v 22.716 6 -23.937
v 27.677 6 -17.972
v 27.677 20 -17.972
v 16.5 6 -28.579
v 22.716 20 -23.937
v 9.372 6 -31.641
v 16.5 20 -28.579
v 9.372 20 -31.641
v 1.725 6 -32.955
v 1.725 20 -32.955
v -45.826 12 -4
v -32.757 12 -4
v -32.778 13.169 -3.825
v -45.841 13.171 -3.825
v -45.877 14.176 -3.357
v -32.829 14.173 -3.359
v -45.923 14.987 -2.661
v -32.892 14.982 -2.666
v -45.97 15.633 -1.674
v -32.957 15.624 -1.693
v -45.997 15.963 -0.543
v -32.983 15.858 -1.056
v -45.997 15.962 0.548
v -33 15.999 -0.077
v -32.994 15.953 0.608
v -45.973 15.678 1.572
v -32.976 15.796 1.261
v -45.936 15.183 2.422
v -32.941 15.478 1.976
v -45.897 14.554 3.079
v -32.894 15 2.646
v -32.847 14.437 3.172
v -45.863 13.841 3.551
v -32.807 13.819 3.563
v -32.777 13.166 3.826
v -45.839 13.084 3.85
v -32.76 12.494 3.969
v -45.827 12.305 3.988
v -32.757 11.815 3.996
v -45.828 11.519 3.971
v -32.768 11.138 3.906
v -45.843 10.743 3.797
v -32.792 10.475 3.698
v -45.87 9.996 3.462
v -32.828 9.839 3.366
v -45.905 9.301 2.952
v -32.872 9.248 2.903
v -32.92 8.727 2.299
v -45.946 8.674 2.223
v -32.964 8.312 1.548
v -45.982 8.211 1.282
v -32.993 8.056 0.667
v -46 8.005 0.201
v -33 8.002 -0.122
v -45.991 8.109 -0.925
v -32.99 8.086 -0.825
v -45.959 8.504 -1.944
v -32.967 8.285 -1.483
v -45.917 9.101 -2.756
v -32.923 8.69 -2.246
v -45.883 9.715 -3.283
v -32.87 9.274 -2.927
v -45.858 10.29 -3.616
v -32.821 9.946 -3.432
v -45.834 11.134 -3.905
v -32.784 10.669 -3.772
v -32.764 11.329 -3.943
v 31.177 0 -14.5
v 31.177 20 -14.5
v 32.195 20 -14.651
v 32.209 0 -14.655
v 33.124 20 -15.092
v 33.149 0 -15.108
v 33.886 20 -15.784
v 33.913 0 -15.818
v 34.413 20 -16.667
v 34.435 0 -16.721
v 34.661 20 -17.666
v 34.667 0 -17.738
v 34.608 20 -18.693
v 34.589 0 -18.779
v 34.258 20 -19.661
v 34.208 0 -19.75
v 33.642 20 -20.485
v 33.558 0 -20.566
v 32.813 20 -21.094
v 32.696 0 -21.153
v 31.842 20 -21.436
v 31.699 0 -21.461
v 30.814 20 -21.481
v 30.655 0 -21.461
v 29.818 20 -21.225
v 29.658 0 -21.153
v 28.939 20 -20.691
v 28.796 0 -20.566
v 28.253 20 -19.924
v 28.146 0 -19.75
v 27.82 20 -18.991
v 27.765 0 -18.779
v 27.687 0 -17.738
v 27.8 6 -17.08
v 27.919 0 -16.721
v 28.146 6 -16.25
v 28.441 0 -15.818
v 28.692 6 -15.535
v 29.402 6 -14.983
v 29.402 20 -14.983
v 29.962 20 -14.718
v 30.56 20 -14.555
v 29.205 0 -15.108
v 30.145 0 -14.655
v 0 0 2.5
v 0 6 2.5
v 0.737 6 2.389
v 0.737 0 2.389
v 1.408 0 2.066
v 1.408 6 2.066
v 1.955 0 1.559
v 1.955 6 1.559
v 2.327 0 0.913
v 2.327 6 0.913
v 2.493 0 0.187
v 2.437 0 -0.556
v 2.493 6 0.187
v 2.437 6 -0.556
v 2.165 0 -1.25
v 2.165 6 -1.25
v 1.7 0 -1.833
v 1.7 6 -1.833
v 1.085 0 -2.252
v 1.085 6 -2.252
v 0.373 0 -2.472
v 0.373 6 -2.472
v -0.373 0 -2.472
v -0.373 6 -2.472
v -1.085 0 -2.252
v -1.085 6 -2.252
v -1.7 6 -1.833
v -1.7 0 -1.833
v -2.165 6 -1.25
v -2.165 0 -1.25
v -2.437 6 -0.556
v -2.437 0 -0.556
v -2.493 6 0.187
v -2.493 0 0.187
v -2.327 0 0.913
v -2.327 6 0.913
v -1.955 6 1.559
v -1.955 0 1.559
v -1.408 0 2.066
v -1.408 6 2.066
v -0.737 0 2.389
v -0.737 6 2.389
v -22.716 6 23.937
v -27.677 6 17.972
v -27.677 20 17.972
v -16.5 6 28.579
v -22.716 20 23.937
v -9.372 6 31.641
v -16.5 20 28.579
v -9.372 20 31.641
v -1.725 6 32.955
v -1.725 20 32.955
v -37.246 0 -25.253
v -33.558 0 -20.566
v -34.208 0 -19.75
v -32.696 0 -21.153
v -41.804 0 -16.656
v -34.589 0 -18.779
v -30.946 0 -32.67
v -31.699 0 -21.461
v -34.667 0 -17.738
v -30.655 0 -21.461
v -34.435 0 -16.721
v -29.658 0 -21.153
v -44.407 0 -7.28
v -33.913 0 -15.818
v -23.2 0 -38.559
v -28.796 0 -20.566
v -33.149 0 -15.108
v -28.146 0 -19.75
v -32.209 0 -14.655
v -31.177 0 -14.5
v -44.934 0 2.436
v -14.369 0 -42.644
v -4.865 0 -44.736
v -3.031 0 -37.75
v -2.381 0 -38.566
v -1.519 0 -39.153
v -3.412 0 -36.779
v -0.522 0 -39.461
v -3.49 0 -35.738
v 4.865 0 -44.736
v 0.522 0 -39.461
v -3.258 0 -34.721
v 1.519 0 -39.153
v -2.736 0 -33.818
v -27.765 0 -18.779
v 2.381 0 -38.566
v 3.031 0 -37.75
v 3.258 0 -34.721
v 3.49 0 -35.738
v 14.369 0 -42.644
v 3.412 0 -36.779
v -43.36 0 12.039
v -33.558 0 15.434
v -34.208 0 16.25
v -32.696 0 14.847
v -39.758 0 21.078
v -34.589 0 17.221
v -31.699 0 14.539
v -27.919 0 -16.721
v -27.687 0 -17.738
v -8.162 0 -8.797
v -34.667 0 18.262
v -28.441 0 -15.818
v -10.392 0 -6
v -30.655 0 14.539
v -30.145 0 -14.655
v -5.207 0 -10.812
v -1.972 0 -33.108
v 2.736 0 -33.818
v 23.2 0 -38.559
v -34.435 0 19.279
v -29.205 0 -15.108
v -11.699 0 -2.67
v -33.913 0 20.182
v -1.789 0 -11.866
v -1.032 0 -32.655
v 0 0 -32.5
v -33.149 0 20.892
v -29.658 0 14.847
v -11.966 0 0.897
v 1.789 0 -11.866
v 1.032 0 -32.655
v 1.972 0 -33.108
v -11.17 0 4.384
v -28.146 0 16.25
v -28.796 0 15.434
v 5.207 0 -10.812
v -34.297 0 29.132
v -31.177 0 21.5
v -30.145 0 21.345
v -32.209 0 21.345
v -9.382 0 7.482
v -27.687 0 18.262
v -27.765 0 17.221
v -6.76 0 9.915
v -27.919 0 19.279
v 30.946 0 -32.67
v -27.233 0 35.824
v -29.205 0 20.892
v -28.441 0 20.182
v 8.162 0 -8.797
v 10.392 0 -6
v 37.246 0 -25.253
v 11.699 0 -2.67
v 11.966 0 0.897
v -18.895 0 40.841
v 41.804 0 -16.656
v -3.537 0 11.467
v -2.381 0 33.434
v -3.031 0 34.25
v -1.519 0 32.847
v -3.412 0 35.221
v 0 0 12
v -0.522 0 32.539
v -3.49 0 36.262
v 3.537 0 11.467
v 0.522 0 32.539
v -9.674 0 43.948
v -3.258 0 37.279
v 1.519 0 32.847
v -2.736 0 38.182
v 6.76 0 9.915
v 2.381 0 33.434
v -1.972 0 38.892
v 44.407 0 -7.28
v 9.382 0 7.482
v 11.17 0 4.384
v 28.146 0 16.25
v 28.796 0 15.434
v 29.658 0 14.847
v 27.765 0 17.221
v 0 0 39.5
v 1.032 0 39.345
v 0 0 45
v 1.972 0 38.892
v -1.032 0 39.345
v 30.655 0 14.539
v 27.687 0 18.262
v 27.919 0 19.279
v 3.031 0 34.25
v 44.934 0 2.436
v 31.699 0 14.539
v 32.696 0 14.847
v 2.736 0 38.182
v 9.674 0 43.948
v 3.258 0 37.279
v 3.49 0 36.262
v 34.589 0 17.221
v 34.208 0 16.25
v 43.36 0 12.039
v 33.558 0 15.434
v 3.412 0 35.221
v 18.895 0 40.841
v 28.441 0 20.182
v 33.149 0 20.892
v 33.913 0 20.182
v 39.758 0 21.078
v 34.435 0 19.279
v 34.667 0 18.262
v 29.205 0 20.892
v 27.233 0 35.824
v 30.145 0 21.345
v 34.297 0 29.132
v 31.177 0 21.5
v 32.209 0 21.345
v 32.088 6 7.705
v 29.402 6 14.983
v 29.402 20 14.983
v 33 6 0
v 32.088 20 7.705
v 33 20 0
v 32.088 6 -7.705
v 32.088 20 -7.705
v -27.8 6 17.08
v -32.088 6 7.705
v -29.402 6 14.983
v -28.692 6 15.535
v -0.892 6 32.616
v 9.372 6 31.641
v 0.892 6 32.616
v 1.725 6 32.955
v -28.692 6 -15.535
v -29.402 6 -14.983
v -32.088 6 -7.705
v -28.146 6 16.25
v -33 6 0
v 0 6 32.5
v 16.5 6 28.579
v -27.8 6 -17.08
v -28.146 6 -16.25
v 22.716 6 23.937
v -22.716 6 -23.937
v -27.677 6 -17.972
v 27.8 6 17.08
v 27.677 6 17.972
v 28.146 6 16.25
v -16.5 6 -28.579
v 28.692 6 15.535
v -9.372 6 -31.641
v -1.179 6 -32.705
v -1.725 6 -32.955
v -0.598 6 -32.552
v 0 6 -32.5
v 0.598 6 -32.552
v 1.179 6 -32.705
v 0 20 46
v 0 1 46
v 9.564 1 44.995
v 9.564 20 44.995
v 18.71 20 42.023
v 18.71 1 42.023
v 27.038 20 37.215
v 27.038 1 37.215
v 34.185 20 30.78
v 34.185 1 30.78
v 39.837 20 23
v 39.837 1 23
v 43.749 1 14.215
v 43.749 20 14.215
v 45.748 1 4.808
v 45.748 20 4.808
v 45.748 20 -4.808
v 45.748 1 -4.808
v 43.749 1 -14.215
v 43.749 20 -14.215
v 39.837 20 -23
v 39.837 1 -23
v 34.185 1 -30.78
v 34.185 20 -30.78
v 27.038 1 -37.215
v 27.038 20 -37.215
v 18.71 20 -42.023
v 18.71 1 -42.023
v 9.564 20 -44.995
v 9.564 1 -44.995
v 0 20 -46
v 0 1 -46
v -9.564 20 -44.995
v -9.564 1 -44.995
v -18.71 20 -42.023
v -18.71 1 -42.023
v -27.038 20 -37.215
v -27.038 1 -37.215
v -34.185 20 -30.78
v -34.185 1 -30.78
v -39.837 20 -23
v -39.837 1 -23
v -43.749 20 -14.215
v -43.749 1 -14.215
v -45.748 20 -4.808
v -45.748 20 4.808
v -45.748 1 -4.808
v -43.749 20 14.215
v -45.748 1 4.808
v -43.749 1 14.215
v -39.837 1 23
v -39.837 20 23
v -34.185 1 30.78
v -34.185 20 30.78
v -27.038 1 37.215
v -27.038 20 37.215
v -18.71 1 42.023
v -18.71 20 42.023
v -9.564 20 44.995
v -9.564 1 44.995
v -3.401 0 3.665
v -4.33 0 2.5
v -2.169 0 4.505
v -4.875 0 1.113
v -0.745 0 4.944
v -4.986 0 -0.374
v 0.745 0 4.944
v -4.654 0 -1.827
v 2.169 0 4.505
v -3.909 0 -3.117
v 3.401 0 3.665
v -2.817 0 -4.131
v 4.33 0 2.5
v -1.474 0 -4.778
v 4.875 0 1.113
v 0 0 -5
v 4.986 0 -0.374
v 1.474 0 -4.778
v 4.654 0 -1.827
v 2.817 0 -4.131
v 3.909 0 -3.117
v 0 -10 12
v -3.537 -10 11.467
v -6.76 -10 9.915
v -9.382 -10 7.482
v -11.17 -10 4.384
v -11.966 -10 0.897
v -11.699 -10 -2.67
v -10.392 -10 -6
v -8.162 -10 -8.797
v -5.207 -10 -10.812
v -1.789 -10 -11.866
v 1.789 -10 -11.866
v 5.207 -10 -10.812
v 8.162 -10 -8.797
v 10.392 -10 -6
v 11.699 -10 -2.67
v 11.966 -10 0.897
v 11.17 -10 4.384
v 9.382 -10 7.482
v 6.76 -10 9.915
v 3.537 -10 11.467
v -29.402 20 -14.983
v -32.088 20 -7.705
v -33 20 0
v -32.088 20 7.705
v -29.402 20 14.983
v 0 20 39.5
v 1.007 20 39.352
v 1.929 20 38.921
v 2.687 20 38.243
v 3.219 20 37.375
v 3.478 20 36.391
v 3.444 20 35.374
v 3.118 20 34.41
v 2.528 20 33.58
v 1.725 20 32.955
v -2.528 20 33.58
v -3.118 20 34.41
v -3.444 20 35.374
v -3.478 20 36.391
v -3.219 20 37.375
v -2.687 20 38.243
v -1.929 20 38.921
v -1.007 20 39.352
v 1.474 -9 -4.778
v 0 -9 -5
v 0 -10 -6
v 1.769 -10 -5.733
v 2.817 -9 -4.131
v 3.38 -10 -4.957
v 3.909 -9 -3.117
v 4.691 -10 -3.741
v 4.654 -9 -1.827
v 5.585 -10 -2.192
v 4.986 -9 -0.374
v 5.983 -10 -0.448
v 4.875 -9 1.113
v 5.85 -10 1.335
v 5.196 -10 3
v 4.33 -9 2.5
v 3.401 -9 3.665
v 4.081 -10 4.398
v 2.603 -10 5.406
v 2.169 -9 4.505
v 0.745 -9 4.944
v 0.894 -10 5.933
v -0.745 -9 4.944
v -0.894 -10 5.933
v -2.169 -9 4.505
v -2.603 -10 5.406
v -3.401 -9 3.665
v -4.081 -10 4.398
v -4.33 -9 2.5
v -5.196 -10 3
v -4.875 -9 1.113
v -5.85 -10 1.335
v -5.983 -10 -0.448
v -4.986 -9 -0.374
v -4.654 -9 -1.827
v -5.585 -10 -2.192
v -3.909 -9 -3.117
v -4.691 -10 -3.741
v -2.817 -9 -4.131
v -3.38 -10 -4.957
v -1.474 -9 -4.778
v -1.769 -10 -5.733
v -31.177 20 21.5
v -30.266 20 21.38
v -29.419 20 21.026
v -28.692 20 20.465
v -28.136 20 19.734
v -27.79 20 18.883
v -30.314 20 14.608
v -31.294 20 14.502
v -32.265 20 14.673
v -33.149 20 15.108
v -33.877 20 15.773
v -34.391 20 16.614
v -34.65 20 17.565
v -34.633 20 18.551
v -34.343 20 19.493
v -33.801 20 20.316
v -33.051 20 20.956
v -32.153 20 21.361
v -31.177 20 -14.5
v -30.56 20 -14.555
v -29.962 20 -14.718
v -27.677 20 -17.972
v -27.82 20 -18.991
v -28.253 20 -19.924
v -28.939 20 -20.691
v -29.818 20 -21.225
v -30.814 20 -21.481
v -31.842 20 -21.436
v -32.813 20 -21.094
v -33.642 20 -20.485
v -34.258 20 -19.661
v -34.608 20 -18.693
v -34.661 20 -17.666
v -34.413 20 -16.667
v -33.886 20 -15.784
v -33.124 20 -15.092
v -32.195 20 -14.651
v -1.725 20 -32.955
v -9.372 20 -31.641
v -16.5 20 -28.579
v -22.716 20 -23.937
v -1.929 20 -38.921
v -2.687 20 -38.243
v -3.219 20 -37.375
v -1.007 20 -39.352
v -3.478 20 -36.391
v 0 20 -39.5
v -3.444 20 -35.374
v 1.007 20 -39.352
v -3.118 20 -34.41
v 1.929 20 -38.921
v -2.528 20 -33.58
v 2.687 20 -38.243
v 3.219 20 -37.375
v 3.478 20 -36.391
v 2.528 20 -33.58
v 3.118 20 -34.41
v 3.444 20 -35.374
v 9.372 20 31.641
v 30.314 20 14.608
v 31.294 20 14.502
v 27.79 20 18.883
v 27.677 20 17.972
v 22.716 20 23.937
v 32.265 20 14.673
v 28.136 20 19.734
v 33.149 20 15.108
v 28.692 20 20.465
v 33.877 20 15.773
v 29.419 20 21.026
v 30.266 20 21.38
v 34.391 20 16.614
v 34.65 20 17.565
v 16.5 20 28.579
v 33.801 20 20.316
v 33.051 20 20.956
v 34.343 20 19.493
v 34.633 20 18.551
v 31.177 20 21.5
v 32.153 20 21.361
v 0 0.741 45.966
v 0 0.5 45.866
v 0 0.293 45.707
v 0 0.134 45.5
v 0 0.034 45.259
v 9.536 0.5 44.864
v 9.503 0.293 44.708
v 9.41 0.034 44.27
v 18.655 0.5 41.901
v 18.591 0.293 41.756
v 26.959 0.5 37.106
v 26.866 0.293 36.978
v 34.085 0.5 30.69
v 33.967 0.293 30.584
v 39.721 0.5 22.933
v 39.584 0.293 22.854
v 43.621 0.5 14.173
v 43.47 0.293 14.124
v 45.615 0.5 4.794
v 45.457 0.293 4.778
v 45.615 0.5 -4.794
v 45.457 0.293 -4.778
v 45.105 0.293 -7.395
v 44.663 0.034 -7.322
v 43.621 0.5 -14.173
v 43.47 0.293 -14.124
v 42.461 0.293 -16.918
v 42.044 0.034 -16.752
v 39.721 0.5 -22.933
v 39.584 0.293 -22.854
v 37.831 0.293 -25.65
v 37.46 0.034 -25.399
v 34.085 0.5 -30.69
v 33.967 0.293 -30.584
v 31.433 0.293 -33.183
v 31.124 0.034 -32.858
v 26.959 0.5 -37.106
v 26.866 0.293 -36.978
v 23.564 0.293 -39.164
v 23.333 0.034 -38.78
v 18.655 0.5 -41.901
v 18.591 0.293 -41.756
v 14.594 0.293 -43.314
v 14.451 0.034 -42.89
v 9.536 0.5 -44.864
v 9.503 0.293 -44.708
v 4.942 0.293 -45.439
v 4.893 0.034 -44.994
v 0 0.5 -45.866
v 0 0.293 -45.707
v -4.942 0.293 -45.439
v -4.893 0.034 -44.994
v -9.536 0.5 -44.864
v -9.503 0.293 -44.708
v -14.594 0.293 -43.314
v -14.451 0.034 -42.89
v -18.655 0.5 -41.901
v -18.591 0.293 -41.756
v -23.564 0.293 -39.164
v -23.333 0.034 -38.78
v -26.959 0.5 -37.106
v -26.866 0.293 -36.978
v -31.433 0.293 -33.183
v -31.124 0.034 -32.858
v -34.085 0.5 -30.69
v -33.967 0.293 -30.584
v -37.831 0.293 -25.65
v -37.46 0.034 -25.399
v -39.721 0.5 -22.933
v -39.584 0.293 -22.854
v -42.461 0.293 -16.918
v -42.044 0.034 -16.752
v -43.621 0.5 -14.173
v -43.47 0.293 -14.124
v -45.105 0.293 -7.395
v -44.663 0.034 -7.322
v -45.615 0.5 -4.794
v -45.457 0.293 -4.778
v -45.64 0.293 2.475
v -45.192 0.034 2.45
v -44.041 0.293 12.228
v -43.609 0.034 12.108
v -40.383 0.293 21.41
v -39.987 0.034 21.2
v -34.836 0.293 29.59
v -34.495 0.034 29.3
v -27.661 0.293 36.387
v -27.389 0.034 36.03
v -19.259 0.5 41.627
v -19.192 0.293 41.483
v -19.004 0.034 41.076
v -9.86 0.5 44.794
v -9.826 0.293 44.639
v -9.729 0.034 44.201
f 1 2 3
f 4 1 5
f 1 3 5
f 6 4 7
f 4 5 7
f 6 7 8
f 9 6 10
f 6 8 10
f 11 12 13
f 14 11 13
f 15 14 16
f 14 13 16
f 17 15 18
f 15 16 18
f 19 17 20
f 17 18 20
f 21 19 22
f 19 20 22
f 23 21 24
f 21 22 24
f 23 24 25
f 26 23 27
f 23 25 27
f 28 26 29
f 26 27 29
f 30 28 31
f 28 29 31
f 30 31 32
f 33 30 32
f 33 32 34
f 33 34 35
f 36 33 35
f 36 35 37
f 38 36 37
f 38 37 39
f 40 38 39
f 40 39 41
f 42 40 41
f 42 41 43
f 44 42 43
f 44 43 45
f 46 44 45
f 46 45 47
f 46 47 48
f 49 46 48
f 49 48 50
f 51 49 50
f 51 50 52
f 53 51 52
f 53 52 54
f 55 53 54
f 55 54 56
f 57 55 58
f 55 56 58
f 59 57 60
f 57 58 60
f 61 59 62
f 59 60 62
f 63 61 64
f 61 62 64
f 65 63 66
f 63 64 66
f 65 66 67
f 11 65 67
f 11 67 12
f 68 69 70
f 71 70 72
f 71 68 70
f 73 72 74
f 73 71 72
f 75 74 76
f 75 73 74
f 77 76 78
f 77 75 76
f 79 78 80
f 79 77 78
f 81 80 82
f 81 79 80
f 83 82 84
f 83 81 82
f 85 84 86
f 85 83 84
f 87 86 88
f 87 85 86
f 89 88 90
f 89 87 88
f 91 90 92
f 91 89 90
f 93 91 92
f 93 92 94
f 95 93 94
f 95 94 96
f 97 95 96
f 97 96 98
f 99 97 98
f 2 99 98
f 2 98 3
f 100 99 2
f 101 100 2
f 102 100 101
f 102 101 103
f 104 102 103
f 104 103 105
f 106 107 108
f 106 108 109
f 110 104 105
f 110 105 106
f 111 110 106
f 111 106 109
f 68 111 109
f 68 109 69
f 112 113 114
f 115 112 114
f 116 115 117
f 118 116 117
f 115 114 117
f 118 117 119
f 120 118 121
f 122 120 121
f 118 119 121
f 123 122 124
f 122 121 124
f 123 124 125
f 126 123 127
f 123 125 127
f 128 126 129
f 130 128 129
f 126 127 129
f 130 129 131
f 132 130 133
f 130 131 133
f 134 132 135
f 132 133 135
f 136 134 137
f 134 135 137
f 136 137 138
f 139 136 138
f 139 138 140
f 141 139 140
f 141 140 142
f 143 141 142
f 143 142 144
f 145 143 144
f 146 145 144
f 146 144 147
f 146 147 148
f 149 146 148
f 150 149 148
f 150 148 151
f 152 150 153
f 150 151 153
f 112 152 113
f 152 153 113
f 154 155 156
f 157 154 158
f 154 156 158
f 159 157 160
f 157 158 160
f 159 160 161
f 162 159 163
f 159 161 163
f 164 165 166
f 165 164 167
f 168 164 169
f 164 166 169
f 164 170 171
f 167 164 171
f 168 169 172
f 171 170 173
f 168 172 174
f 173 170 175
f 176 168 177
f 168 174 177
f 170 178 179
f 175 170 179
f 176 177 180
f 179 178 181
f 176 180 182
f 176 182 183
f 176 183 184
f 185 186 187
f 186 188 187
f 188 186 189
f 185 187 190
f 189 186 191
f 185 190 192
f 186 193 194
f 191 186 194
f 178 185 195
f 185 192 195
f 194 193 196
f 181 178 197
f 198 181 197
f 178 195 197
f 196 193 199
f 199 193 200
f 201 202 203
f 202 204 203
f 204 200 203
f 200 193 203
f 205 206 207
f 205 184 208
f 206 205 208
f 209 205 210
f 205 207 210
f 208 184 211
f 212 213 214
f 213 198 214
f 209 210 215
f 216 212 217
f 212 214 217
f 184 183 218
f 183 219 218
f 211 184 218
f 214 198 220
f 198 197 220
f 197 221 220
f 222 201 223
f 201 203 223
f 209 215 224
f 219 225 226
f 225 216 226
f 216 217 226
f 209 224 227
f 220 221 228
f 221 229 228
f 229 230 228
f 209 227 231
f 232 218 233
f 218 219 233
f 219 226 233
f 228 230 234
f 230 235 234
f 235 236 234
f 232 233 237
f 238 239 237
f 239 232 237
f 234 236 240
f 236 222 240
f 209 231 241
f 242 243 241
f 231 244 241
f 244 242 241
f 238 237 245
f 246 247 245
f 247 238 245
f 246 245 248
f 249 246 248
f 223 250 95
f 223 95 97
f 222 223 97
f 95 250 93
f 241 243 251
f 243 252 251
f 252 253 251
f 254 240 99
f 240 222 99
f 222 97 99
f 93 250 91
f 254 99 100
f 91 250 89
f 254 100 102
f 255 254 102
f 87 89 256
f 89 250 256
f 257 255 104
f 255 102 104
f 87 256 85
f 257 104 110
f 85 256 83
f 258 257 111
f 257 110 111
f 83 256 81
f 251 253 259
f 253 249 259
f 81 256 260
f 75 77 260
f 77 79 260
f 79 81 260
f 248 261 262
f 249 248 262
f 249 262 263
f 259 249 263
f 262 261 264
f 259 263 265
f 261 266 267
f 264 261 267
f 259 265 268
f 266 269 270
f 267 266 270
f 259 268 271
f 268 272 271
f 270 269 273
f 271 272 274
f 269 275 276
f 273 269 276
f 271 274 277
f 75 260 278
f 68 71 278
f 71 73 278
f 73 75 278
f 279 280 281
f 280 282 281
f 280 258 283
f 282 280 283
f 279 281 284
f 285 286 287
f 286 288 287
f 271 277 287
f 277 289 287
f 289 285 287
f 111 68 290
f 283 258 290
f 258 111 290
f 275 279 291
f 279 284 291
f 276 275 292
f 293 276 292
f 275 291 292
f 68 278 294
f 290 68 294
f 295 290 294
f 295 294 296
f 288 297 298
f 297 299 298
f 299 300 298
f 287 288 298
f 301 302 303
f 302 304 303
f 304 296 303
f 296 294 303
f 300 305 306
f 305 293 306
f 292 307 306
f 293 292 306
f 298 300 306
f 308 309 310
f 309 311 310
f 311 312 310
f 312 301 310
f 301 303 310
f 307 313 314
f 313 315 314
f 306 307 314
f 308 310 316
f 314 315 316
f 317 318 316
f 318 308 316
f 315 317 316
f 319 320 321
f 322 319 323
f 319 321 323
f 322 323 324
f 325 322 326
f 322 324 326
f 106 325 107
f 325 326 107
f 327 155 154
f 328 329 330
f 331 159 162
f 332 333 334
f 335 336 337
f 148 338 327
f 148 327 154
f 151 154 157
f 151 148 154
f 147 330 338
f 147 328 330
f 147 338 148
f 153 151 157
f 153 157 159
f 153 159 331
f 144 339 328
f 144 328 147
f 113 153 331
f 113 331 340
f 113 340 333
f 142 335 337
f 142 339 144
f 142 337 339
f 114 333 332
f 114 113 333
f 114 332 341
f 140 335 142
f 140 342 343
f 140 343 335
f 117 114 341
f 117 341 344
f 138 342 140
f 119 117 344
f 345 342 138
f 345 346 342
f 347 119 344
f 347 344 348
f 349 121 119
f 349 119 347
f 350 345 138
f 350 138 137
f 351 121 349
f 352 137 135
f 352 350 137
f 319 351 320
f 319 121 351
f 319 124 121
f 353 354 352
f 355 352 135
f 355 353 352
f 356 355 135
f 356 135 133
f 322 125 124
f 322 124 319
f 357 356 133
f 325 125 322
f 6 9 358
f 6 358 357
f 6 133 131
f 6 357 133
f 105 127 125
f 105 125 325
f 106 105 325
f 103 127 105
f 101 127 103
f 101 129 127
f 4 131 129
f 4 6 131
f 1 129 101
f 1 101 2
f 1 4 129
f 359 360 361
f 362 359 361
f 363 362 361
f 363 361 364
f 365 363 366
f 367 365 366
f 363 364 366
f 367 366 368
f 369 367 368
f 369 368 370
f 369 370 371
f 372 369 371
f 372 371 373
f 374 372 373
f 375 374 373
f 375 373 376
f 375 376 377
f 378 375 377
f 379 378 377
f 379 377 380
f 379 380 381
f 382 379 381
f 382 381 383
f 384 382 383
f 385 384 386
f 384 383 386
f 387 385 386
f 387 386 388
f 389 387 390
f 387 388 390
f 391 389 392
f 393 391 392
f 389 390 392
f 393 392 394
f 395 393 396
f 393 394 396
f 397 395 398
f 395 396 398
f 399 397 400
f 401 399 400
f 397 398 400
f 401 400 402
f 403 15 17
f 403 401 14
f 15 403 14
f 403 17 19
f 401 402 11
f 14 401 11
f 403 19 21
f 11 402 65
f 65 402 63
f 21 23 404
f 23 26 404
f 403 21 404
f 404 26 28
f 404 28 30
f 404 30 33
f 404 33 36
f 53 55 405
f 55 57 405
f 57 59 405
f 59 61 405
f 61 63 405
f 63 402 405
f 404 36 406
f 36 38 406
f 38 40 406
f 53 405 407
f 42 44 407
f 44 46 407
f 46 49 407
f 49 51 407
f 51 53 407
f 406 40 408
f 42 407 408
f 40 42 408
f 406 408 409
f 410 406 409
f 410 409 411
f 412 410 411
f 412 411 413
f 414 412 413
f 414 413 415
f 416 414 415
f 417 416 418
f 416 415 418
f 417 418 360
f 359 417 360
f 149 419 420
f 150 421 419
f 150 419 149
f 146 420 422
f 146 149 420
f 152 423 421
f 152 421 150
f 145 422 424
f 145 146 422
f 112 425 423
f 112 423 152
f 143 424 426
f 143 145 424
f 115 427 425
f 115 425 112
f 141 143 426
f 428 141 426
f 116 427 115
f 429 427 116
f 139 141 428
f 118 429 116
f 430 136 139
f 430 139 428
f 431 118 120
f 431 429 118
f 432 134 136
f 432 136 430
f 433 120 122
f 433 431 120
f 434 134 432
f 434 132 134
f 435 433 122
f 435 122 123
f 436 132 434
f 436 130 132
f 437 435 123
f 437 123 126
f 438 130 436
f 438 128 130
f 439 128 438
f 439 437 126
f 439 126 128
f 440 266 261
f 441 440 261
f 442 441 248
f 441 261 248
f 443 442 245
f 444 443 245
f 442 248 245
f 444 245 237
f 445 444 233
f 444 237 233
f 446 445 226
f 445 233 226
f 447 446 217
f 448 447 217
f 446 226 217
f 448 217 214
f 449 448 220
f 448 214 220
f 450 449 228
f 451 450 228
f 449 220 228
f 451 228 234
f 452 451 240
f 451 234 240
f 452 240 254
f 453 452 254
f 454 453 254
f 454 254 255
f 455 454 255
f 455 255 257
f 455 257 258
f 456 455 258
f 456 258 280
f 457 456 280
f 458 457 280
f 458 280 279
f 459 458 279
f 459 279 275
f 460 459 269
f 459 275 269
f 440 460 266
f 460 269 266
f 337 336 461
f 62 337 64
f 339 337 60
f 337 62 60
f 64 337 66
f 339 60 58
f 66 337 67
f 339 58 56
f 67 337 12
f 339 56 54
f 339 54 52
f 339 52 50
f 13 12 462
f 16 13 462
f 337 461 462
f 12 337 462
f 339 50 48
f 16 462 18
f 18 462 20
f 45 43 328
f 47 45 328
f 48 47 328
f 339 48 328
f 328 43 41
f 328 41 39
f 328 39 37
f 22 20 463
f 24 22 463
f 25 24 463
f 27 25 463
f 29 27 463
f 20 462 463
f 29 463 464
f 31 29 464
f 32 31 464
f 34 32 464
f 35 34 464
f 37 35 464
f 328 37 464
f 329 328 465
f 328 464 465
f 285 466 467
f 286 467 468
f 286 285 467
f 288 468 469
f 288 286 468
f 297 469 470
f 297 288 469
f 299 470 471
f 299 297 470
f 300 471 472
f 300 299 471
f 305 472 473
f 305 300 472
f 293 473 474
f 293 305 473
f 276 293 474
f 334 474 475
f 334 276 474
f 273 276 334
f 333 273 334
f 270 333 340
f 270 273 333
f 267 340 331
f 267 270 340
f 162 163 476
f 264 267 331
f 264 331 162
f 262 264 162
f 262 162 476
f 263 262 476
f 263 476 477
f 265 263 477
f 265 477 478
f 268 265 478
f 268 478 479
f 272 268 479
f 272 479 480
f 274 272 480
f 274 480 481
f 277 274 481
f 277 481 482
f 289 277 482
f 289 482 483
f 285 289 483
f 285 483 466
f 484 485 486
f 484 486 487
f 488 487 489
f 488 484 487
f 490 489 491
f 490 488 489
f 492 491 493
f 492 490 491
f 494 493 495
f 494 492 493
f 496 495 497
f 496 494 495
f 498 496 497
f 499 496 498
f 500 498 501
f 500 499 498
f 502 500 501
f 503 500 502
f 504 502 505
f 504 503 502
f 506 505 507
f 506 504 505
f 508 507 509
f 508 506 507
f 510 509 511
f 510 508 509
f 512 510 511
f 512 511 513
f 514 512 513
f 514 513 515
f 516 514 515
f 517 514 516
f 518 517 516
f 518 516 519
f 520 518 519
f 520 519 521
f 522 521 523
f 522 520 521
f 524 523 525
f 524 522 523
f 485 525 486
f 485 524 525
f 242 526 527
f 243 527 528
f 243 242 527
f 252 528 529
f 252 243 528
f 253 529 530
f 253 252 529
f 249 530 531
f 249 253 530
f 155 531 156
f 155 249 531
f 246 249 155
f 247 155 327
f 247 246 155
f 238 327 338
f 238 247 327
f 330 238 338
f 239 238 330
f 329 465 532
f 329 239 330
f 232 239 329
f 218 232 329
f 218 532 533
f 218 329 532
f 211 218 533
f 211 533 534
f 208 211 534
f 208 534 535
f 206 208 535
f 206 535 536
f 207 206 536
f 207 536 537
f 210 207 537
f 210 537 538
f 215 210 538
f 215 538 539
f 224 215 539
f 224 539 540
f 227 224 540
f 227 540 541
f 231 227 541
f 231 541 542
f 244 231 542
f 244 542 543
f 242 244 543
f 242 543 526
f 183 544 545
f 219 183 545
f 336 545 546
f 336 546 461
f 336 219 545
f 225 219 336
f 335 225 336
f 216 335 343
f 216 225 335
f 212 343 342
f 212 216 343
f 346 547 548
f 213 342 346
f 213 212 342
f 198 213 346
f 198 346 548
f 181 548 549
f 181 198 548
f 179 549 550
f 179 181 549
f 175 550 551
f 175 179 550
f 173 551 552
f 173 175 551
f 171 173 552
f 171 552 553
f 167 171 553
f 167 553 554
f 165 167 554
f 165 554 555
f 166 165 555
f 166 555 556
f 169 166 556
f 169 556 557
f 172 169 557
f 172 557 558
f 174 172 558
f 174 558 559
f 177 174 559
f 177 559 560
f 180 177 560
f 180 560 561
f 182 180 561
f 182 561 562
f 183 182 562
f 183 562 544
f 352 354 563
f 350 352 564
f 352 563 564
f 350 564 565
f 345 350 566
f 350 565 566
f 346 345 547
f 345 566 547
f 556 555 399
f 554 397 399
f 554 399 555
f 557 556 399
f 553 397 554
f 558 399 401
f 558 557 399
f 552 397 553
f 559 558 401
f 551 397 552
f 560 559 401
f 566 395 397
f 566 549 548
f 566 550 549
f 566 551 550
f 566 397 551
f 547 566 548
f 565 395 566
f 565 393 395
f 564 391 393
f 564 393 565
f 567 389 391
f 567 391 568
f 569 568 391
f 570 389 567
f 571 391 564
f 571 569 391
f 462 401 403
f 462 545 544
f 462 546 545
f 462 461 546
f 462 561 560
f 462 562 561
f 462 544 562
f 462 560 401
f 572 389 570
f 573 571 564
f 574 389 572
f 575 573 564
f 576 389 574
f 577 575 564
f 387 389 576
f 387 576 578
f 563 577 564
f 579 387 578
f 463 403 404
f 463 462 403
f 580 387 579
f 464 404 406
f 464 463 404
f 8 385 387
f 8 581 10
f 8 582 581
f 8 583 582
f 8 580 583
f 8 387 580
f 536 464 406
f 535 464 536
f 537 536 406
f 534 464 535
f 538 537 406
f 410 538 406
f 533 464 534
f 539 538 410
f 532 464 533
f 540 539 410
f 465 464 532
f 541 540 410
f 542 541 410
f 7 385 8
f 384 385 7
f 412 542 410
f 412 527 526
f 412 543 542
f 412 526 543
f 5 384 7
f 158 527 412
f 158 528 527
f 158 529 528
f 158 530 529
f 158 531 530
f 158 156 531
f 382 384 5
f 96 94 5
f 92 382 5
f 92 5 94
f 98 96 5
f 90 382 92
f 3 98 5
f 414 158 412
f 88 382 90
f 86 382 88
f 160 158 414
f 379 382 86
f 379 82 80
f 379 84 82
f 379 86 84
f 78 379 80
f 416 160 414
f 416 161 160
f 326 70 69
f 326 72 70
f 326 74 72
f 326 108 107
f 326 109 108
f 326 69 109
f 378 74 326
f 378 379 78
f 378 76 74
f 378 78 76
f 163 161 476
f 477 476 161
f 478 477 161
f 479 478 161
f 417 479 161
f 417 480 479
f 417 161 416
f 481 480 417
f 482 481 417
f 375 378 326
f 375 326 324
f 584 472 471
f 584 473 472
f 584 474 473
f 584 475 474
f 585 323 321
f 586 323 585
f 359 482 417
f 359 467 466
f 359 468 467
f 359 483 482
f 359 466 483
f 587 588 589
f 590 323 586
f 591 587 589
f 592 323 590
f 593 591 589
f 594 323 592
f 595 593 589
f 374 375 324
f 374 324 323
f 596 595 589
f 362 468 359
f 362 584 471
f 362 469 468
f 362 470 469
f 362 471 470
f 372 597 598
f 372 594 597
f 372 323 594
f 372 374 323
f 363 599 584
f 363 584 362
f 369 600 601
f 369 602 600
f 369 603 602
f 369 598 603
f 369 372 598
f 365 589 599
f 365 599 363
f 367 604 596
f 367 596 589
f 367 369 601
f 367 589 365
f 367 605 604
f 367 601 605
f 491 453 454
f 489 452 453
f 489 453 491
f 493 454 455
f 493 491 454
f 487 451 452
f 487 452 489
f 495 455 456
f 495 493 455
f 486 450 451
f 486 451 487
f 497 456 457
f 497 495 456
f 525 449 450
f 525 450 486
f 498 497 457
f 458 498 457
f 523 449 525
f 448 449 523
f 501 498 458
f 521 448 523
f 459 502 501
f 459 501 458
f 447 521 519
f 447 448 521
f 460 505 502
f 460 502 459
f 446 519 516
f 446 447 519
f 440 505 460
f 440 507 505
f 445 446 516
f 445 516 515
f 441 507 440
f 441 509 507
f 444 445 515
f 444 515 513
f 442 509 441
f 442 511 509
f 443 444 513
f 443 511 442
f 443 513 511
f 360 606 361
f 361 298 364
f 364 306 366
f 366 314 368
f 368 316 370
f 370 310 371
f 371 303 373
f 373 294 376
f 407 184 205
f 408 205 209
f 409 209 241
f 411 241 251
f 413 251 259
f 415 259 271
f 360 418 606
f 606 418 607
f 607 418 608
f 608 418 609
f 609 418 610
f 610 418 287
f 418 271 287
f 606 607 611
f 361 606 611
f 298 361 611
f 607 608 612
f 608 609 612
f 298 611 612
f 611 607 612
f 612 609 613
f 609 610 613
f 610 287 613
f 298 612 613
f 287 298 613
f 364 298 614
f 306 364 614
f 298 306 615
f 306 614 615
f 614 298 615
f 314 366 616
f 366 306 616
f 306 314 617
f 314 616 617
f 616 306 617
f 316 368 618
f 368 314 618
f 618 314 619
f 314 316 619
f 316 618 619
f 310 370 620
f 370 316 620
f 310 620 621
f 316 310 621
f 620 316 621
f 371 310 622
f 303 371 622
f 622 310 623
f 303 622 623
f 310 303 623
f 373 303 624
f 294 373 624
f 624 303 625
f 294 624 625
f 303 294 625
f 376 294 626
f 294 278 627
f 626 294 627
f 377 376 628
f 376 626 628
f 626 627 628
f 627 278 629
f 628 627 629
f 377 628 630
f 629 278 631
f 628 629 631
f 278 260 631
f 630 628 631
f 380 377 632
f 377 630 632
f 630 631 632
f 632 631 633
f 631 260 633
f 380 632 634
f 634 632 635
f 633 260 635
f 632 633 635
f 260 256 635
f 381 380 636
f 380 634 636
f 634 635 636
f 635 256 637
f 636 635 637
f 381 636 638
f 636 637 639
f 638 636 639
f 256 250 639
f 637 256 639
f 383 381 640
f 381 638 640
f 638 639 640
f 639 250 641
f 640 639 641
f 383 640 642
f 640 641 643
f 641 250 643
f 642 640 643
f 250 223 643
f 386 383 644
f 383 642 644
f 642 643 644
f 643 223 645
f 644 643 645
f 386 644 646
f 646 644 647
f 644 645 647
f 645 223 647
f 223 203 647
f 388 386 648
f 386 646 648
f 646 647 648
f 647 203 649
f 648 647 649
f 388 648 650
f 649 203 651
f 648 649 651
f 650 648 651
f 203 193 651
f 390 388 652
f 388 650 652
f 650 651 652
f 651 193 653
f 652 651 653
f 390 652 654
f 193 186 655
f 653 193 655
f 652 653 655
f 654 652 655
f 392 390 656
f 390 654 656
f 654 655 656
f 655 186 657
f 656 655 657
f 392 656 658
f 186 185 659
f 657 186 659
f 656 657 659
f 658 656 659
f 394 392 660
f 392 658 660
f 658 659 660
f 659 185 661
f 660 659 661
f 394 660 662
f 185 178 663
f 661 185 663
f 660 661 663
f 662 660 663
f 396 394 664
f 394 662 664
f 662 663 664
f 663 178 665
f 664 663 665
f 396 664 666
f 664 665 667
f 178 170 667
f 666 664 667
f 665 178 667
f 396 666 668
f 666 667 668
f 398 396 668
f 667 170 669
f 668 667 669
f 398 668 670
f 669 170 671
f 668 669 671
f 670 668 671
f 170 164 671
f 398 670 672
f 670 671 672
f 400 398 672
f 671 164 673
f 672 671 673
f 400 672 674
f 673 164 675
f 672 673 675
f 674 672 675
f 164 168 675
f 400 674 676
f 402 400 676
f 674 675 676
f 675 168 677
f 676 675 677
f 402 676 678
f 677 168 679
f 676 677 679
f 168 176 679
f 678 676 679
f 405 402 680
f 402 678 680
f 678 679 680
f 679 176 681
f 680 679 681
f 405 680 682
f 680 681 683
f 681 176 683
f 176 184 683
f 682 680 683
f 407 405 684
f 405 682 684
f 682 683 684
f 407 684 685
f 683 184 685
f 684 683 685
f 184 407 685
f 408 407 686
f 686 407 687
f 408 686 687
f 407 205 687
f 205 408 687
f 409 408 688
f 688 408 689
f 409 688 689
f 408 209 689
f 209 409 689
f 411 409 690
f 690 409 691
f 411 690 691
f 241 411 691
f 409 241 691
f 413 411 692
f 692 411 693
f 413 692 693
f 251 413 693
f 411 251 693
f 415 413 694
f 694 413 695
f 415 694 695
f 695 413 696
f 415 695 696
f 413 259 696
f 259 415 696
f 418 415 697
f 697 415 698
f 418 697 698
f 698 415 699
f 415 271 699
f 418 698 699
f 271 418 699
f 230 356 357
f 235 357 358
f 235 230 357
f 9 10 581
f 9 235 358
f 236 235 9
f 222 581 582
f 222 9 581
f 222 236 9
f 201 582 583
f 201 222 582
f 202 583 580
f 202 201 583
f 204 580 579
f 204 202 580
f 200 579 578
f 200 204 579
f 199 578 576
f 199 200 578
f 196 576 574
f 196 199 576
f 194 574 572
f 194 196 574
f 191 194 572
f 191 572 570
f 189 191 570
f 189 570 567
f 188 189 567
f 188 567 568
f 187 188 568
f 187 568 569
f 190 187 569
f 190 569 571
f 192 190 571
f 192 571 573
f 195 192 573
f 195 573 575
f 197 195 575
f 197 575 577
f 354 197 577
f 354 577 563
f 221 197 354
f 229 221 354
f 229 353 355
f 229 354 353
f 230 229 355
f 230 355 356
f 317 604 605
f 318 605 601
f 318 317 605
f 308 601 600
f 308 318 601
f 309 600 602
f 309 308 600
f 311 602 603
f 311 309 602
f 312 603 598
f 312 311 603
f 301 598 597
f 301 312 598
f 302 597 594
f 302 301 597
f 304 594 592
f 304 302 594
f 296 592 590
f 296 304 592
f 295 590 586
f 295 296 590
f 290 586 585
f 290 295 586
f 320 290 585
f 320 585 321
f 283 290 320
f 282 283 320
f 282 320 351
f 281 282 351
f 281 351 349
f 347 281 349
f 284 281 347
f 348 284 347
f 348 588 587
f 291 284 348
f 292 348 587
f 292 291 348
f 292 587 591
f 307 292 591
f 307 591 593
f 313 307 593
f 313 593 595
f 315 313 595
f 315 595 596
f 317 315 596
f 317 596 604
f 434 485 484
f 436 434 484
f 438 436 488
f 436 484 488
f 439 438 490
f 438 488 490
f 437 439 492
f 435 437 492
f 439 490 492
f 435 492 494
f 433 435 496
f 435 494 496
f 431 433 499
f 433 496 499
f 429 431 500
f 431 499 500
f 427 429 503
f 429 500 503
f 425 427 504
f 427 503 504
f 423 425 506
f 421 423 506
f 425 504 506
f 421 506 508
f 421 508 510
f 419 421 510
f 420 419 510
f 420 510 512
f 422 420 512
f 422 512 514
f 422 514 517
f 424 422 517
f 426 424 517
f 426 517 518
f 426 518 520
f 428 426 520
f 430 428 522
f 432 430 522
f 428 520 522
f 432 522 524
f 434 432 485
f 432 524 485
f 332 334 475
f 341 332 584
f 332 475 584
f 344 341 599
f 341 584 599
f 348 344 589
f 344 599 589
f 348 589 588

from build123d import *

# Parameters (mm, degrees)
SKETCH1_R           = 46
SKETCH1_R_2         = 3.5
BOSS_EXTRUDE1_DEPTH = 20
SKETCH2_R           = 33
CUT_EXTRUDE1_DEPTH  = 14
FILLET2_R           = 1
SKETCH3_R           = 12
BOSS_EXTRUDE2_DEPTH = 10
SKETCH4_R           = 2.5
CUT_EXTRUDE2_DEPTH  = 6
SKETCH5_R           = 5
CUT_EXTRUDE3_DEPTH  = 10
CHAMFER1_SIZE       = 1
SKETCH6_R           = 4
CUT_EXTRUDE4_DEPTH  = 69.058798176


with BuildPart() as part:
    # Sketch1 → Boss-Extrude1 (new body)
    with BuildSketch(Plane(origin=(0, 0, 0), x_dir=(1, 0, 0), z_dir=(0, 1, 0))):
        with Locations(Location((0, 0, 0), (0, 0, 270))):
            Circle(SKETCH1_R)
        with Locations(Location((0, 36, 0), (0, 0, 270))):
            Circle(SKETCH1_R_2, mode=Mode.SUBTRACT)
        with Locations(Location((-31.176914536, 18, 0), (0, 0, 270))):
            Circle(SKETCH1_R_2, mode=Mode.SUBTRACT)
        with Locations(Location((-31.176914536, -18, 0), (0, 0, 270))):
            Circle(SKETCH1_R_2, mode=Mode.SUBTRACT)
        with Locations(Location((0, -36, 0), (0, 0, 270))):
            Circle(SKETCH1_R_2, mode=Mode.SUBTRACT)
        with Locations(Location((31.176914536, -18, 0), (0, 0, 270))):
            Circle(SKETCH1_R_2, mode=Mode.SUBTRACT)
        with Locations(Location((31.176914536, 18, 0), (0, 0, 270))):
            Circle(SKETCH1_R_2, mode=Mode.SUBTRACT)
    extrude(amount=BOSS_EXTRUDE1_DEPTH)

    # Sketch2 → Cut-Extrude1 (cut)
    with BuildSketch(Plane(origin=(0, 20, 0), x_dir=(1, 0, 0), z_dir=(0, 1, 0))):
        Circle(SKETCH2_R)
    extrude(amount=-CUT_EXTRUDE1_DEPTH, mode=Mode.SUBTRACT)

    # Fillet2
    fillet2_edges = [part.edges().sort_by_distance(p)[0] for p in [
        (0, 0, -46),
    ]]
    fillet(fillet2_edges, radius=FILLET2_R)

    # Sketch3 → Boss-Extrude2 (add)
    with BuildSketch(Plane(origin=(0, 0, 0), x_dir=(-1, 0, 0), z_dir=(0, -1, 0))):
        with Locations(Location((0, 0, 0), (0, 0, 270))):
            Circle(SKETCH3_R)
    extrude(amount=BOSS_EXTRUDE2_DEPTH)

    # Sketch4 → Cut-Extrude2 (cut)
    with BuildSketch(Plane(origin=(0, 6, 0), x_dir=(1, 0, 0), z_dir=(0, 1, 0))):
        with Locations(Location((0, 0, 0), (0, 0, 270))):
            Circle(SKETCH4_R)
    extrude(amount=-CUT_EXTRUDE2_DEPTH, mode=Mode.SUBTRACT)

    # Sketch5 → Cut-Extrude3 (cut)
    with BuildSketch(Plane(origin=(0, -10, 0), x_dir=(-1, 0, 0), z_dir=(0, -1, 0))):
        with Locations(Location((0, 0, 0), (0, 0, 90))):
            Circle(SKETCH5_R)
    extrude(amount=-CUT_EXTRUDE3_DEPTH, mode=Mode.SUBTRACT)

    # Chamfer1
    chamfer1_edges = [part.edges().sort_by_distance(p)[0] for p in [
        (0, -10, 5),
    ]]
    chamfer(chamfer1_edges, length=CHAMFER1_SIZE)

    # Sketch6 → Cut-Extrude4 (cut, through all)
    with BuildSketch(Plane(origin=(0, 0, 0), x_dir=(0, 0, -1), z_dir=(1, 0, 0))):
        with Locations((0, 12)):
            Circle(SKETCH6_R)
    extrude(amount=-CUT_EXTRUDE4_DEPTH, mode=Mode.SUBTRACT)


solid = part.part
